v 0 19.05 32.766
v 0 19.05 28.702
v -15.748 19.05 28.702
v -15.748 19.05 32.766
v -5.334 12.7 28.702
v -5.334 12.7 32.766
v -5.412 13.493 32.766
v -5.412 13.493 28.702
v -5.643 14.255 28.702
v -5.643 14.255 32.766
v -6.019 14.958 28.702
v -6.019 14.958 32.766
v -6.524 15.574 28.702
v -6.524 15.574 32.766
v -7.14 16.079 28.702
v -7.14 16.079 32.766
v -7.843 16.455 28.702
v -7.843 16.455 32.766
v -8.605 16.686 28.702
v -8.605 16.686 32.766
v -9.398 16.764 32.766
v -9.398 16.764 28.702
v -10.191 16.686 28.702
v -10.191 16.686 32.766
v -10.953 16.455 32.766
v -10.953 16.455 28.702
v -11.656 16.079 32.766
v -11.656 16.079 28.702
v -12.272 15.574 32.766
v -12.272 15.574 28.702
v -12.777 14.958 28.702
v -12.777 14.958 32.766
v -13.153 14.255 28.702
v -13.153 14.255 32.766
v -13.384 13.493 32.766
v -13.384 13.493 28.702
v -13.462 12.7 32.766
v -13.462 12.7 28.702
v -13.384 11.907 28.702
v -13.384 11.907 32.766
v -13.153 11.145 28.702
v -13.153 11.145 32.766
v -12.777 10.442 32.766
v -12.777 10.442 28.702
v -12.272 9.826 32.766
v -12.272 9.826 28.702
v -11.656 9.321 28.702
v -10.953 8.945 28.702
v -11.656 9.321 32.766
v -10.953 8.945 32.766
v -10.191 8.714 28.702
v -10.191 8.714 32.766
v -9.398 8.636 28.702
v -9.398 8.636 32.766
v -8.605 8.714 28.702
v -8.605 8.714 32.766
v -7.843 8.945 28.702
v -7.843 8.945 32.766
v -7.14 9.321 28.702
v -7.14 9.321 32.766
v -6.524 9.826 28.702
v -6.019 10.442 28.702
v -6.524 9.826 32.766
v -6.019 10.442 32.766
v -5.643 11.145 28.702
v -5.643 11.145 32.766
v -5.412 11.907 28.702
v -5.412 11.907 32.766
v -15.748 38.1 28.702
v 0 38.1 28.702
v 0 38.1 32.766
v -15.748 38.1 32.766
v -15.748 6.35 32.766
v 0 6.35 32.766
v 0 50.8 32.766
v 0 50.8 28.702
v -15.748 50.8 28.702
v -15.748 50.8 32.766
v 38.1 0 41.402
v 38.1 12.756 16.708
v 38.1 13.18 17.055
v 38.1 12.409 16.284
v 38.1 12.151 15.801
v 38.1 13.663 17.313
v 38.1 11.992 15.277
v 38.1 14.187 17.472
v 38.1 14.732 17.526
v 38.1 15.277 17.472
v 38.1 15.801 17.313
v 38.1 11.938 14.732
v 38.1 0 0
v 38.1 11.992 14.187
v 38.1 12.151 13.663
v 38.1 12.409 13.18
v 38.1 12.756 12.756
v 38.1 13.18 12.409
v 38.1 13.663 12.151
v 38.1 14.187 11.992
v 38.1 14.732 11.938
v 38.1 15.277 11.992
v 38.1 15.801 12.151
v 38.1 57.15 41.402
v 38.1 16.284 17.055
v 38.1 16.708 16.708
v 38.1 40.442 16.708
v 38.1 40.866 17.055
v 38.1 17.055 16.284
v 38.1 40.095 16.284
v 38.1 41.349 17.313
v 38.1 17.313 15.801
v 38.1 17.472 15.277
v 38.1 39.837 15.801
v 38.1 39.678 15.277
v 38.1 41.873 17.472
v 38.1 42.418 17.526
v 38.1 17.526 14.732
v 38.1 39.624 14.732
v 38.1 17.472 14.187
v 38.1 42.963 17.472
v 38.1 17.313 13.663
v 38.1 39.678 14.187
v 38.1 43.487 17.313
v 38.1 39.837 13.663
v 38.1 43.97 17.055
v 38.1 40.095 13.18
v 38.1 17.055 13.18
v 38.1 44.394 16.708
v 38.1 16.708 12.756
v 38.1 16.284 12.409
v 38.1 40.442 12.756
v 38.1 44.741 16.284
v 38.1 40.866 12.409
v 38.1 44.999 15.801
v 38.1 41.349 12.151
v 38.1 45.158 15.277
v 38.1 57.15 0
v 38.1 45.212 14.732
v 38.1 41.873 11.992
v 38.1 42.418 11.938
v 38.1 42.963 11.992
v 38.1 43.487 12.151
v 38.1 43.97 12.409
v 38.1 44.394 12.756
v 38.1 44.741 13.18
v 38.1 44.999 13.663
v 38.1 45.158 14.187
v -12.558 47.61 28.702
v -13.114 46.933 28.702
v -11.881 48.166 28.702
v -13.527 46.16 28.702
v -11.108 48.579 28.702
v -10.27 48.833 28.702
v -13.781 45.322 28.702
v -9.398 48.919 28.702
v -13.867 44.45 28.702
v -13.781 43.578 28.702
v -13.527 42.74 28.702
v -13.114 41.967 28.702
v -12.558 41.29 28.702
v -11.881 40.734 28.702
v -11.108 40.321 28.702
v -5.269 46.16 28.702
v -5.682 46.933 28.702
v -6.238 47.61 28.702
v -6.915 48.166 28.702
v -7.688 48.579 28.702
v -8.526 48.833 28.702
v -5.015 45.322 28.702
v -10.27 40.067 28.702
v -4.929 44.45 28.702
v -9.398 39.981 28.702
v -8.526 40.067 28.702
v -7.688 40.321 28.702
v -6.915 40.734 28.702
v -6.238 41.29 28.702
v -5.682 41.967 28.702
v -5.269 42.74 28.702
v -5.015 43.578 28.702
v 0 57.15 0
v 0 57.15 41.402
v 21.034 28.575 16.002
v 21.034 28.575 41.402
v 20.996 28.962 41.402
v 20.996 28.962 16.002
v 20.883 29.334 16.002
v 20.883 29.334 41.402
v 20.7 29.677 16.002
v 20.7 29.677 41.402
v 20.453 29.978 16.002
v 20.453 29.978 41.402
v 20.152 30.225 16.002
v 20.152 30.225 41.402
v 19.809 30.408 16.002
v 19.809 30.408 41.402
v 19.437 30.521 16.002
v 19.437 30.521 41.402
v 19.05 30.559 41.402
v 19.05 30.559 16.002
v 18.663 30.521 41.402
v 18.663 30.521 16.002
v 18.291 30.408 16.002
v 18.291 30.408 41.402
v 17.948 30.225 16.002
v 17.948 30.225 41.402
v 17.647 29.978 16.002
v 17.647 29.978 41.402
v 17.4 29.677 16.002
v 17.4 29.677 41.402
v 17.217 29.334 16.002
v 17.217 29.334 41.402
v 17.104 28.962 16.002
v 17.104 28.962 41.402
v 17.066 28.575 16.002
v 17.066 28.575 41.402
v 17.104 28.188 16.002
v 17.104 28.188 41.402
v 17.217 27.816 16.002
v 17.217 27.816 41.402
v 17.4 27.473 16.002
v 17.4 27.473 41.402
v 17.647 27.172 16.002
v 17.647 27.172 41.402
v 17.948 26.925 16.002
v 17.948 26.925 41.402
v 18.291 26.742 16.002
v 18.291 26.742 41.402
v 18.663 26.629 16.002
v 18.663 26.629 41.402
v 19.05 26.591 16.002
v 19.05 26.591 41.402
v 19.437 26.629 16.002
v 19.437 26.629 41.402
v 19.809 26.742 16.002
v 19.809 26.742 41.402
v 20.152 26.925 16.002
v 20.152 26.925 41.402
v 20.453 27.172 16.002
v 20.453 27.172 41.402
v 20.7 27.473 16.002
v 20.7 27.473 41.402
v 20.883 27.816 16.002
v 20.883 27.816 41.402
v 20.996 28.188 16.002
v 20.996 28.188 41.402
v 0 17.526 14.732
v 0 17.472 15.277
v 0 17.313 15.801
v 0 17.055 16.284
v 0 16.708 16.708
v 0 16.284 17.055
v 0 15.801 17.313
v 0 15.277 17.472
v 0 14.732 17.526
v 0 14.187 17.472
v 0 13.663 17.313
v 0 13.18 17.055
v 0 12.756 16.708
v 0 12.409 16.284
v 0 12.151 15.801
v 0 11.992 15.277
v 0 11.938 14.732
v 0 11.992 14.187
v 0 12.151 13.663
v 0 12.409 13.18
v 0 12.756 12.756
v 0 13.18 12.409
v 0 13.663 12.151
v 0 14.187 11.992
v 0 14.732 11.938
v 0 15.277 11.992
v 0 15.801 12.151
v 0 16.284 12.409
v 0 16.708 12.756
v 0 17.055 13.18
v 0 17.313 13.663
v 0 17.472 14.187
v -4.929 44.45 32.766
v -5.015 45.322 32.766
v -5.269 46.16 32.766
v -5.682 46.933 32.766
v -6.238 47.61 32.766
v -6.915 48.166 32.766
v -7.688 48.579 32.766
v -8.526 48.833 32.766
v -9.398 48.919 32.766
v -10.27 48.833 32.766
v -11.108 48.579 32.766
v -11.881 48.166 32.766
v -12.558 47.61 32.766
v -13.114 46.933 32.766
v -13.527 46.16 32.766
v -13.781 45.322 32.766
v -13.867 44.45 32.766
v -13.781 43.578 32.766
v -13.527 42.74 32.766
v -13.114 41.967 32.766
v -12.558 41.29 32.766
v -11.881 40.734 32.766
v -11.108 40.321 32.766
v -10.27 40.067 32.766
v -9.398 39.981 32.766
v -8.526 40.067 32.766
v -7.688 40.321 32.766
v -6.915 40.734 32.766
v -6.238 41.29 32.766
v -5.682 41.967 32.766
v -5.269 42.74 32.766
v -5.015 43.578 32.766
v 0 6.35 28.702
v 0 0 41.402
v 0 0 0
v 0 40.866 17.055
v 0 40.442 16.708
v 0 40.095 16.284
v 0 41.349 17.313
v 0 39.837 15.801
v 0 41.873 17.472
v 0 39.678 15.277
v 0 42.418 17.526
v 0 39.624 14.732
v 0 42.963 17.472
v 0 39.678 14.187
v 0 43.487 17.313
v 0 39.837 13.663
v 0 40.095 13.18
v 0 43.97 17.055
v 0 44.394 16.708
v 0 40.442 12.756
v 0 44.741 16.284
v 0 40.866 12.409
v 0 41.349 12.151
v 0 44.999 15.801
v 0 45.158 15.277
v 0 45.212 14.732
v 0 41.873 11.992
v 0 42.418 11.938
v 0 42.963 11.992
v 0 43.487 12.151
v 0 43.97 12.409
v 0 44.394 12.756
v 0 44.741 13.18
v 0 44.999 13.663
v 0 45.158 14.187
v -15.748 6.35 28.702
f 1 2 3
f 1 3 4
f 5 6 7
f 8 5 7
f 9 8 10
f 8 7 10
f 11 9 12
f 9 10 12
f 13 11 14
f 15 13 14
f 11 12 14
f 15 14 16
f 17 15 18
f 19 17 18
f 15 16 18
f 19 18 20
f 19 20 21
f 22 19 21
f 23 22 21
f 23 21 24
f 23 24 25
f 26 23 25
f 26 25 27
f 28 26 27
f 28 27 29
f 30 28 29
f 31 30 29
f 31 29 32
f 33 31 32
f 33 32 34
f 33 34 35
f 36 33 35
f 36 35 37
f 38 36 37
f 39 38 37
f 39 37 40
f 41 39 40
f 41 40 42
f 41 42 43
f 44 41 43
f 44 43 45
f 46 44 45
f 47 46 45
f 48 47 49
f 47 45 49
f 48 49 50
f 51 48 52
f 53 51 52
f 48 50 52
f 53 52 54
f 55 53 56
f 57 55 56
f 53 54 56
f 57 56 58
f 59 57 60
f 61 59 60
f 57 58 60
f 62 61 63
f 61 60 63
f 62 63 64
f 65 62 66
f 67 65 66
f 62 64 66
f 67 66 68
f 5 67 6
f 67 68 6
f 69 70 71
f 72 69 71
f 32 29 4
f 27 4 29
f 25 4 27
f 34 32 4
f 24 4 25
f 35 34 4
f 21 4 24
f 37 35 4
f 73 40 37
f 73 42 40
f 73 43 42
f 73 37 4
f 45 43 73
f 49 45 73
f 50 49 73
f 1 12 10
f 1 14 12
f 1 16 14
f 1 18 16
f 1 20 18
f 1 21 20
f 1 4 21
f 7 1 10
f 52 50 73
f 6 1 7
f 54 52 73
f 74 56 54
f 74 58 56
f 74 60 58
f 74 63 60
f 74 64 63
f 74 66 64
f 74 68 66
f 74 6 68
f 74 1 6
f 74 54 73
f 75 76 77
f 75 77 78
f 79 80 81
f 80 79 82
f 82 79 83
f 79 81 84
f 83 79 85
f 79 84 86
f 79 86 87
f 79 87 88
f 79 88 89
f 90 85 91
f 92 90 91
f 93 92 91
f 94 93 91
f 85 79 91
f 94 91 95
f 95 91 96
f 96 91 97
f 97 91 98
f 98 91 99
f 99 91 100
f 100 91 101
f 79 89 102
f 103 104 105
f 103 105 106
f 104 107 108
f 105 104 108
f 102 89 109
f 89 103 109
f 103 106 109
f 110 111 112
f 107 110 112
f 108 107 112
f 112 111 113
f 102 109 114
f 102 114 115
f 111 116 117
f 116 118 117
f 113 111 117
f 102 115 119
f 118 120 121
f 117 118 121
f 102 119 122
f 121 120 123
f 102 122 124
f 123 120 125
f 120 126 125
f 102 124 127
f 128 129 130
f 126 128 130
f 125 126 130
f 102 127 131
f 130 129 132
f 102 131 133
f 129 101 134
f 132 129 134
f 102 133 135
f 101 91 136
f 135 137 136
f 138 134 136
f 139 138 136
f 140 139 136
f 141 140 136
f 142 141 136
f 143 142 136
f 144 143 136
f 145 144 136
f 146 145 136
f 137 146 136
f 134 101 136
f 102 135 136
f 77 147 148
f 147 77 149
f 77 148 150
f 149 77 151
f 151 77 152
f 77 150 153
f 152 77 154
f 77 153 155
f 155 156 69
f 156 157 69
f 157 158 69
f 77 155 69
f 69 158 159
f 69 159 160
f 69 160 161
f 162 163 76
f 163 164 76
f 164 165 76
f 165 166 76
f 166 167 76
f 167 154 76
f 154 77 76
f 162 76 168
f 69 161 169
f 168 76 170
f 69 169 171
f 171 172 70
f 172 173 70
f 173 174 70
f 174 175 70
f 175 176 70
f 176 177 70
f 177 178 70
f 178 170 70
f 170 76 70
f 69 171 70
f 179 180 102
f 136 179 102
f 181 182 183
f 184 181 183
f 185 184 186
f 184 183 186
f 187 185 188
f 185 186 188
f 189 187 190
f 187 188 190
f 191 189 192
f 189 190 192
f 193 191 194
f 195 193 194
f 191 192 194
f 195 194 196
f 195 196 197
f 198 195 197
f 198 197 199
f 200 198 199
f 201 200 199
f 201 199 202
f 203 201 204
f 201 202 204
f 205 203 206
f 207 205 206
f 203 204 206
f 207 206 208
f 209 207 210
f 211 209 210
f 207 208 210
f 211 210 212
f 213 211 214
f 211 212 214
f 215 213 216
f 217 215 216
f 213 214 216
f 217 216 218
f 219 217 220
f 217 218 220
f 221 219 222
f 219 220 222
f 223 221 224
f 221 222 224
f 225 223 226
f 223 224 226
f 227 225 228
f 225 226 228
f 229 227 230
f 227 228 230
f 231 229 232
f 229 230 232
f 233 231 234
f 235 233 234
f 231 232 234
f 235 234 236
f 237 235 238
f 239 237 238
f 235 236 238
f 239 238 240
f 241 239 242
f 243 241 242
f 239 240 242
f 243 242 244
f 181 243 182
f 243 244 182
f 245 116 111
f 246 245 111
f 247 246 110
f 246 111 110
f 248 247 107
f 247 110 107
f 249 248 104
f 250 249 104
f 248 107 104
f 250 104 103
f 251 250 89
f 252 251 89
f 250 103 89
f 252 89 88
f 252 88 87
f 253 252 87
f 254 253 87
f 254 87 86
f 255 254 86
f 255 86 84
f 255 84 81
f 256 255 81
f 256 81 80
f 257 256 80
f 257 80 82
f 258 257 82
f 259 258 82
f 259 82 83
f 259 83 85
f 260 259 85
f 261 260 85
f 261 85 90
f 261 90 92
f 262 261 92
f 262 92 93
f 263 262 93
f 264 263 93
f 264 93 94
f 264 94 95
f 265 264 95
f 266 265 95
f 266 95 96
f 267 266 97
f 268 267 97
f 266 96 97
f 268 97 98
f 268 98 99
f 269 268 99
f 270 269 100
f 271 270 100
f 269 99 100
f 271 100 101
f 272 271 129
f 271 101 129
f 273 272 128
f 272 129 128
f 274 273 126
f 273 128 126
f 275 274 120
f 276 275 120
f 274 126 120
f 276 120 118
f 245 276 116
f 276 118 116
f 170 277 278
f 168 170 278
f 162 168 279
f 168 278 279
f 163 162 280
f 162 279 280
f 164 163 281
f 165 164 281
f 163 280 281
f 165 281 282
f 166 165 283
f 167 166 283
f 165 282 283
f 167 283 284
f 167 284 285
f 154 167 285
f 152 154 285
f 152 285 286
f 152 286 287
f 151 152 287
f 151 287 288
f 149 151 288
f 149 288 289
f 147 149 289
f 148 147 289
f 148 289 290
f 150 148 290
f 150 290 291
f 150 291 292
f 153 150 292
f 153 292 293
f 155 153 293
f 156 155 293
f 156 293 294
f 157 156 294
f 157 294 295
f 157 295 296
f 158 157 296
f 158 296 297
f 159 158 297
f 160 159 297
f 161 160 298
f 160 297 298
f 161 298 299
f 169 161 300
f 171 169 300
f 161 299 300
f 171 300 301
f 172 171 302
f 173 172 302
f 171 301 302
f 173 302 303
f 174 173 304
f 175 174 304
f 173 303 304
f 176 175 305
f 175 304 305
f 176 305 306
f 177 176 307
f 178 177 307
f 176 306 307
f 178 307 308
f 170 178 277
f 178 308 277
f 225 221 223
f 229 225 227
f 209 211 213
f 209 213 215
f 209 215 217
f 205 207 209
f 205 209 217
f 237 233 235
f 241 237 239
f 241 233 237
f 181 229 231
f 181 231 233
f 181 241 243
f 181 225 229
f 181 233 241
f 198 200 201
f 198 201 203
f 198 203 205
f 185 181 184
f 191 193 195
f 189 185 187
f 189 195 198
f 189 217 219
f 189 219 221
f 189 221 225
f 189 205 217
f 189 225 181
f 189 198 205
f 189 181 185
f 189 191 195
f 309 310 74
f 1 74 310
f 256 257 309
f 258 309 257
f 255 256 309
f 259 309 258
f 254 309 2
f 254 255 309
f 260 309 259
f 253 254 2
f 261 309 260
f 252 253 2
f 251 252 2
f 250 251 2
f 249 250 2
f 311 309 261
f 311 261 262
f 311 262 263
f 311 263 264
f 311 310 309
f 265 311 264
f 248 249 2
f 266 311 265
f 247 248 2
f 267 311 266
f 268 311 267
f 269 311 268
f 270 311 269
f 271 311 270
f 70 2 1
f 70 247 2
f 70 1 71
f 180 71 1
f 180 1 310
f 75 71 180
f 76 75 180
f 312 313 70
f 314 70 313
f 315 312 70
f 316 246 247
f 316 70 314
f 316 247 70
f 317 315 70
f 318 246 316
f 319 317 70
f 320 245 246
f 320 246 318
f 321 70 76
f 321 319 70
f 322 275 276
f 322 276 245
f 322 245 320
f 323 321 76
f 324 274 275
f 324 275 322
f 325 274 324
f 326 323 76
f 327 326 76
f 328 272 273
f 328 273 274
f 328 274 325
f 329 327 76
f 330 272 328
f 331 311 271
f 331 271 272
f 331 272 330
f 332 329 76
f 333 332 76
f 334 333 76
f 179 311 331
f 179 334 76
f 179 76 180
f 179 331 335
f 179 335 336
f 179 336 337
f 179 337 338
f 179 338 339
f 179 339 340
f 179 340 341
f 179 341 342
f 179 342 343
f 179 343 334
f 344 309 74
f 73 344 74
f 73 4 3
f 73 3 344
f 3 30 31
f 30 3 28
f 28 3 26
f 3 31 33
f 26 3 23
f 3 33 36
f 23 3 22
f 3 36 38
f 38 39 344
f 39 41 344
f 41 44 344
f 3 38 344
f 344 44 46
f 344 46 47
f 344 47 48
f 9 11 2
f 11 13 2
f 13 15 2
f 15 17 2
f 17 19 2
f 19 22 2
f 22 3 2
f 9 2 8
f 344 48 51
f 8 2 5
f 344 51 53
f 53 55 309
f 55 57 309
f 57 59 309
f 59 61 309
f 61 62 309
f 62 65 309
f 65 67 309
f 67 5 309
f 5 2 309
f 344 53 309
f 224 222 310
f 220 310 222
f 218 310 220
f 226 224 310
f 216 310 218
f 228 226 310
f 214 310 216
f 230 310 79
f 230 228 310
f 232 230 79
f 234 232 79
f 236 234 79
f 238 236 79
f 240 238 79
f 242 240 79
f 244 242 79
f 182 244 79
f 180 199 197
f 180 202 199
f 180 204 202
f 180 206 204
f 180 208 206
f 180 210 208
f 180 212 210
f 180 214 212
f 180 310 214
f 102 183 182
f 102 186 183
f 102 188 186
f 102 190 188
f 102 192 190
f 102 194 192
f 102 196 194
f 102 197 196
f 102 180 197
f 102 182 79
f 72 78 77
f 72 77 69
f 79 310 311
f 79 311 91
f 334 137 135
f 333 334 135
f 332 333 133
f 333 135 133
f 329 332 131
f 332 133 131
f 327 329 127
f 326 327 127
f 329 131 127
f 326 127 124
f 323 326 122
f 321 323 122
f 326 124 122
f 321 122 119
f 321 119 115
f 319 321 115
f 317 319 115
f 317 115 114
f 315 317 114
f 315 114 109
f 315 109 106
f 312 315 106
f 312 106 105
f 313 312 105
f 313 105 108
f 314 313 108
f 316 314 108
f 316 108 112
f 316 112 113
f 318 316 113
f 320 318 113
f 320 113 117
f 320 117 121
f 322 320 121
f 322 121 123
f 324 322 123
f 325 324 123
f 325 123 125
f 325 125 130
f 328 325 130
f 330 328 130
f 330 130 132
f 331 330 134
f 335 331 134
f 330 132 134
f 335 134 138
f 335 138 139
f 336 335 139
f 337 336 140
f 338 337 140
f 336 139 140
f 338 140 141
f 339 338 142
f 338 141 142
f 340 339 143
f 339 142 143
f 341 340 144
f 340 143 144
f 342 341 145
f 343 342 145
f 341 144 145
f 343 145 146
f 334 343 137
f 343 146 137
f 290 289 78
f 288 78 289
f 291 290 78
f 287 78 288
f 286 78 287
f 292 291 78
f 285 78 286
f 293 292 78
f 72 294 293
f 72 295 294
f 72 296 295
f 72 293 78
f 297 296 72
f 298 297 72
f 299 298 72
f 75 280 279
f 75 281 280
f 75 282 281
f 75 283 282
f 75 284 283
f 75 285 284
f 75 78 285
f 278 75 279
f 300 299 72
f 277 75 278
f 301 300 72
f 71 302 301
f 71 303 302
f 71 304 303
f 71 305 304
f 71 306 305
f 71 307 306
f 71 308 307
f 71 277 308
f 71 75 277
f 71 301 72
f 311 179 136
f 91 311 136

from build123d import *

# Parameters (mm, degrees)
F0_W     = 38.1
F0_H     = 57.15
F1_DEPTH = 41.402
F2_R     = 2.794
F3_DEPTH = 38.101
F4_R     = 1.984375
F5_DEPTH = 25.4
F6_W     = 12.7
F6_H     = 4.064
F7_DEPTH = 15.748
F8_R     = 4.468898
F8_R_2   = 4.064
F9_DEPTH = 32.767


with BuildPart() as f1:
    # F0 (on Top) → F1 (new body)
    with BuildSketch(Plane.XY):
        with Locations((19.05, 28.575)):
            Rectangle(F0_W, F0_H)
    extrude(amount=F1_DEPTH)

    # F2 (on face) → F3 (cut, through all)
    with BuildSketch(Plane.YZ.offset(38.1)):
        with Locations((14.732, 14.732)):
            Circle(F2_R)
        with Locations((42.418, 14.732)):
            Circle(F2_R)
    extrude(amount=-F3_DEPTH, mode=Mode.SUBTRACT)

    # F4 (on face) → F5 (cut)
    with BuildSketch(Plane.XY.offset(41.402)):
        with Locations((19.05, 28.575)):
            Circle(F4_R)
    extrude(amount=-F5_DEPTH, mode=Mode.SUBTRACT)

    # F6 (on face) → F7 (join)
    with BuildSketch(Plane(origin=(0, 0, 0), x_dir=(0, -1, 0), z_dir=(-1, 0, 0))):
        with Locations((-44.45, 30.734)):
            Rectangle(F6_W, F6_H)
        with Locations((-12.7, 30.734)):
            Rectangle(F6_W, F6_H)
    extrude(amount=F7_DEPTH)

    # F8 (on face) → F9 (cut, through all)
    with BuildSketch(Plane.XY.offset(32.766)):
        with Locations((-9.398, 44.45)):
            Circle(F8_R)
        with Locations((-9.398, 12.7)):
            Circle(F8_R_2)
    extrude(amount=-F9_DEPTH, mode=Mode.SUBTRACT)


solid = f1.part
